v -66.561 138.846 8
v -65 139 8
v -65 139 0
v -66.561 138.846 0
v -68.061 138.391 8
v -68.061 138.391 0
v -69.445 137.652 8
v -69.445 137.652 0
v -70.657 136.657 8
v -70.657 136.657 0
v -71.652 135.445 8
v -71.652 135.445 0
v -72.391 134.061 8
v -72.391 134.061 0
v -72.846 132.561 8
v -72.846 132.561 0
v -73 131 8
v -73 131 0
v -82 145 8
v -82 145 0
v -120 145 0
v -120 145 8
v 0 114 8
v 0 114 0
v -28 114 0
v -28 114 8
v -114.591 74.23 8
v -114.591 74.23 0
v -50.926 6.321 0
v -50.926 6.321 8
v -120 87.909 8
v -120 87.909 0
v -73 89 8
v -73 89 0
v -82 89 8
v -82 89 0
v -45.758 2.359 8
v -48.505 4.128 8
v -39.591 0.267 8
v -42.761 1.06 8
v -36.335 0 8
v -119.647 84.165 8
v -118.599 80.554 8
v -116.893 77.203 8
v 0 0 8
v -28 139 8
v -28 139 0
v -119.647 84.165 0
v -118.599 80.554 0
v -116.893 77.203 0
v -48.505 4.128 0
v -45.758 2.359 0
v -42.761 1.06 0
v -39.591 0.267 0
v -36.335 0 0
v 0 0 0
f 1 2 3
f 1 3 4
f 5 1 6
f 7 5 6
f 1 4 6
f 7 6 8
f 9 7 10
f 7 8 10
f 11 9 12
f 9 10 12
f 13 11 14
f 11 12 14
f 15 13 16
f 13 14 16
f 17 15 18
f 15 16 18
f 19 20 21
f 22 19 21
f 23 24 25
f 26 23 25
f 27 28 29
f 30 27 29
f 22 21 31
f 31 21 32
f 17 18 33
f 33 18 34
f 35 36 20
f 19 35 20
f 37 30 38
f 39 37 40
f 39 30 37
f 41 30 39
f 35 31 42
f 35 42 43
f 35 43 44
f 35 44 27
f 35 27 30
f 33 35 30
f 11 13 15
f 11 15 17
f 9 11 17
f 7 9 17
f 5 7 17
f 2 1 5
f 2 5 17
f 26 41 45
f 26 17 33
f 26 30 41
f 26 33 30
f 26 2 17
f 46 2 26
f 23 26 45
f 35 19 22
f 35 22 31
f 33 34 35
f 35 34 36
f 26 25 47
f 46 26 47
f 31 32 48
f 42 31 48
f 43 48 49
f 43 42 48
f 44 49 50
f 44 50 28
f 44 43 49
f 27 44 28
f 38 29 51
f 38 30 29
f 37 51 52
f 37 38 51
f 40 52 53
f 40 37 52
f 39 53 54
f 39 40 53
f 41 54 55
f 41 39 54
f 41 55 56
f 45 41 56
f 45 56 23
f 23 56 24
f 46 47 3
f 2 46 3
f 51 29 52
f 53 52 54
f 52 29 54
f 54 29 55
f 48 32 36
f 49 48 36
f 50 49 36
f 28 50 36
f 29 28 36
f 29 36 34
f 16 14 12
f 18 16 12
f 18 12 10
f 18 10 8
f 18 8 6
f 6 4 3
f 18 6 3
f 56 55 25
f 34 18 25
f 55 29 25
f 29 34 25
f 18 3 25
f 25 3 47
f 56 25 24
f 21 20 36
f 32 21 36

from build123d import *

# Parameters (mm, degrees)
EXTRUDE_1_DEPTH = 8
FILLET_1_R      = 20


with BuildPart() as part:
    # 草图1 → 凸台-拉伸1 (new body)
    with BuildSketch(Plane.XY):
        with BuildLine():
            Line((0, 0), (0, 114))
            Line((0, 114), (-28, 114))
            Line((-28, 114), (-28, 139))
            Line((-28, 139), (-65, 139))
            ThreePointArc((-65, 139), (-70.656854249, 136.656854249), (-73, 131))
            Line((-73, 131), (-73, 89))
            Line((-73, 89), (-82, 89))
            Line((-82, 89), (-82, 145))
            Line((-82, 145), (-120, 145))
            Line((-120, 145), (-120, 80))
            Line((-120, 80), (-45, 0))
            Line((-45, 0), (0, 0))
        make_face()
    extrude(amount=EXTRUDE_1_DEPTH)

    # 圆角1
    fillet_1_edges = [part.edges().sort_by_distance(p)[0] for p in [
        (-45, 0, 4),
        (-120, 80, 4),
    ]]
    fillet(fillet_1_edges, radius=FILLET_1_R)


solid = part.part
